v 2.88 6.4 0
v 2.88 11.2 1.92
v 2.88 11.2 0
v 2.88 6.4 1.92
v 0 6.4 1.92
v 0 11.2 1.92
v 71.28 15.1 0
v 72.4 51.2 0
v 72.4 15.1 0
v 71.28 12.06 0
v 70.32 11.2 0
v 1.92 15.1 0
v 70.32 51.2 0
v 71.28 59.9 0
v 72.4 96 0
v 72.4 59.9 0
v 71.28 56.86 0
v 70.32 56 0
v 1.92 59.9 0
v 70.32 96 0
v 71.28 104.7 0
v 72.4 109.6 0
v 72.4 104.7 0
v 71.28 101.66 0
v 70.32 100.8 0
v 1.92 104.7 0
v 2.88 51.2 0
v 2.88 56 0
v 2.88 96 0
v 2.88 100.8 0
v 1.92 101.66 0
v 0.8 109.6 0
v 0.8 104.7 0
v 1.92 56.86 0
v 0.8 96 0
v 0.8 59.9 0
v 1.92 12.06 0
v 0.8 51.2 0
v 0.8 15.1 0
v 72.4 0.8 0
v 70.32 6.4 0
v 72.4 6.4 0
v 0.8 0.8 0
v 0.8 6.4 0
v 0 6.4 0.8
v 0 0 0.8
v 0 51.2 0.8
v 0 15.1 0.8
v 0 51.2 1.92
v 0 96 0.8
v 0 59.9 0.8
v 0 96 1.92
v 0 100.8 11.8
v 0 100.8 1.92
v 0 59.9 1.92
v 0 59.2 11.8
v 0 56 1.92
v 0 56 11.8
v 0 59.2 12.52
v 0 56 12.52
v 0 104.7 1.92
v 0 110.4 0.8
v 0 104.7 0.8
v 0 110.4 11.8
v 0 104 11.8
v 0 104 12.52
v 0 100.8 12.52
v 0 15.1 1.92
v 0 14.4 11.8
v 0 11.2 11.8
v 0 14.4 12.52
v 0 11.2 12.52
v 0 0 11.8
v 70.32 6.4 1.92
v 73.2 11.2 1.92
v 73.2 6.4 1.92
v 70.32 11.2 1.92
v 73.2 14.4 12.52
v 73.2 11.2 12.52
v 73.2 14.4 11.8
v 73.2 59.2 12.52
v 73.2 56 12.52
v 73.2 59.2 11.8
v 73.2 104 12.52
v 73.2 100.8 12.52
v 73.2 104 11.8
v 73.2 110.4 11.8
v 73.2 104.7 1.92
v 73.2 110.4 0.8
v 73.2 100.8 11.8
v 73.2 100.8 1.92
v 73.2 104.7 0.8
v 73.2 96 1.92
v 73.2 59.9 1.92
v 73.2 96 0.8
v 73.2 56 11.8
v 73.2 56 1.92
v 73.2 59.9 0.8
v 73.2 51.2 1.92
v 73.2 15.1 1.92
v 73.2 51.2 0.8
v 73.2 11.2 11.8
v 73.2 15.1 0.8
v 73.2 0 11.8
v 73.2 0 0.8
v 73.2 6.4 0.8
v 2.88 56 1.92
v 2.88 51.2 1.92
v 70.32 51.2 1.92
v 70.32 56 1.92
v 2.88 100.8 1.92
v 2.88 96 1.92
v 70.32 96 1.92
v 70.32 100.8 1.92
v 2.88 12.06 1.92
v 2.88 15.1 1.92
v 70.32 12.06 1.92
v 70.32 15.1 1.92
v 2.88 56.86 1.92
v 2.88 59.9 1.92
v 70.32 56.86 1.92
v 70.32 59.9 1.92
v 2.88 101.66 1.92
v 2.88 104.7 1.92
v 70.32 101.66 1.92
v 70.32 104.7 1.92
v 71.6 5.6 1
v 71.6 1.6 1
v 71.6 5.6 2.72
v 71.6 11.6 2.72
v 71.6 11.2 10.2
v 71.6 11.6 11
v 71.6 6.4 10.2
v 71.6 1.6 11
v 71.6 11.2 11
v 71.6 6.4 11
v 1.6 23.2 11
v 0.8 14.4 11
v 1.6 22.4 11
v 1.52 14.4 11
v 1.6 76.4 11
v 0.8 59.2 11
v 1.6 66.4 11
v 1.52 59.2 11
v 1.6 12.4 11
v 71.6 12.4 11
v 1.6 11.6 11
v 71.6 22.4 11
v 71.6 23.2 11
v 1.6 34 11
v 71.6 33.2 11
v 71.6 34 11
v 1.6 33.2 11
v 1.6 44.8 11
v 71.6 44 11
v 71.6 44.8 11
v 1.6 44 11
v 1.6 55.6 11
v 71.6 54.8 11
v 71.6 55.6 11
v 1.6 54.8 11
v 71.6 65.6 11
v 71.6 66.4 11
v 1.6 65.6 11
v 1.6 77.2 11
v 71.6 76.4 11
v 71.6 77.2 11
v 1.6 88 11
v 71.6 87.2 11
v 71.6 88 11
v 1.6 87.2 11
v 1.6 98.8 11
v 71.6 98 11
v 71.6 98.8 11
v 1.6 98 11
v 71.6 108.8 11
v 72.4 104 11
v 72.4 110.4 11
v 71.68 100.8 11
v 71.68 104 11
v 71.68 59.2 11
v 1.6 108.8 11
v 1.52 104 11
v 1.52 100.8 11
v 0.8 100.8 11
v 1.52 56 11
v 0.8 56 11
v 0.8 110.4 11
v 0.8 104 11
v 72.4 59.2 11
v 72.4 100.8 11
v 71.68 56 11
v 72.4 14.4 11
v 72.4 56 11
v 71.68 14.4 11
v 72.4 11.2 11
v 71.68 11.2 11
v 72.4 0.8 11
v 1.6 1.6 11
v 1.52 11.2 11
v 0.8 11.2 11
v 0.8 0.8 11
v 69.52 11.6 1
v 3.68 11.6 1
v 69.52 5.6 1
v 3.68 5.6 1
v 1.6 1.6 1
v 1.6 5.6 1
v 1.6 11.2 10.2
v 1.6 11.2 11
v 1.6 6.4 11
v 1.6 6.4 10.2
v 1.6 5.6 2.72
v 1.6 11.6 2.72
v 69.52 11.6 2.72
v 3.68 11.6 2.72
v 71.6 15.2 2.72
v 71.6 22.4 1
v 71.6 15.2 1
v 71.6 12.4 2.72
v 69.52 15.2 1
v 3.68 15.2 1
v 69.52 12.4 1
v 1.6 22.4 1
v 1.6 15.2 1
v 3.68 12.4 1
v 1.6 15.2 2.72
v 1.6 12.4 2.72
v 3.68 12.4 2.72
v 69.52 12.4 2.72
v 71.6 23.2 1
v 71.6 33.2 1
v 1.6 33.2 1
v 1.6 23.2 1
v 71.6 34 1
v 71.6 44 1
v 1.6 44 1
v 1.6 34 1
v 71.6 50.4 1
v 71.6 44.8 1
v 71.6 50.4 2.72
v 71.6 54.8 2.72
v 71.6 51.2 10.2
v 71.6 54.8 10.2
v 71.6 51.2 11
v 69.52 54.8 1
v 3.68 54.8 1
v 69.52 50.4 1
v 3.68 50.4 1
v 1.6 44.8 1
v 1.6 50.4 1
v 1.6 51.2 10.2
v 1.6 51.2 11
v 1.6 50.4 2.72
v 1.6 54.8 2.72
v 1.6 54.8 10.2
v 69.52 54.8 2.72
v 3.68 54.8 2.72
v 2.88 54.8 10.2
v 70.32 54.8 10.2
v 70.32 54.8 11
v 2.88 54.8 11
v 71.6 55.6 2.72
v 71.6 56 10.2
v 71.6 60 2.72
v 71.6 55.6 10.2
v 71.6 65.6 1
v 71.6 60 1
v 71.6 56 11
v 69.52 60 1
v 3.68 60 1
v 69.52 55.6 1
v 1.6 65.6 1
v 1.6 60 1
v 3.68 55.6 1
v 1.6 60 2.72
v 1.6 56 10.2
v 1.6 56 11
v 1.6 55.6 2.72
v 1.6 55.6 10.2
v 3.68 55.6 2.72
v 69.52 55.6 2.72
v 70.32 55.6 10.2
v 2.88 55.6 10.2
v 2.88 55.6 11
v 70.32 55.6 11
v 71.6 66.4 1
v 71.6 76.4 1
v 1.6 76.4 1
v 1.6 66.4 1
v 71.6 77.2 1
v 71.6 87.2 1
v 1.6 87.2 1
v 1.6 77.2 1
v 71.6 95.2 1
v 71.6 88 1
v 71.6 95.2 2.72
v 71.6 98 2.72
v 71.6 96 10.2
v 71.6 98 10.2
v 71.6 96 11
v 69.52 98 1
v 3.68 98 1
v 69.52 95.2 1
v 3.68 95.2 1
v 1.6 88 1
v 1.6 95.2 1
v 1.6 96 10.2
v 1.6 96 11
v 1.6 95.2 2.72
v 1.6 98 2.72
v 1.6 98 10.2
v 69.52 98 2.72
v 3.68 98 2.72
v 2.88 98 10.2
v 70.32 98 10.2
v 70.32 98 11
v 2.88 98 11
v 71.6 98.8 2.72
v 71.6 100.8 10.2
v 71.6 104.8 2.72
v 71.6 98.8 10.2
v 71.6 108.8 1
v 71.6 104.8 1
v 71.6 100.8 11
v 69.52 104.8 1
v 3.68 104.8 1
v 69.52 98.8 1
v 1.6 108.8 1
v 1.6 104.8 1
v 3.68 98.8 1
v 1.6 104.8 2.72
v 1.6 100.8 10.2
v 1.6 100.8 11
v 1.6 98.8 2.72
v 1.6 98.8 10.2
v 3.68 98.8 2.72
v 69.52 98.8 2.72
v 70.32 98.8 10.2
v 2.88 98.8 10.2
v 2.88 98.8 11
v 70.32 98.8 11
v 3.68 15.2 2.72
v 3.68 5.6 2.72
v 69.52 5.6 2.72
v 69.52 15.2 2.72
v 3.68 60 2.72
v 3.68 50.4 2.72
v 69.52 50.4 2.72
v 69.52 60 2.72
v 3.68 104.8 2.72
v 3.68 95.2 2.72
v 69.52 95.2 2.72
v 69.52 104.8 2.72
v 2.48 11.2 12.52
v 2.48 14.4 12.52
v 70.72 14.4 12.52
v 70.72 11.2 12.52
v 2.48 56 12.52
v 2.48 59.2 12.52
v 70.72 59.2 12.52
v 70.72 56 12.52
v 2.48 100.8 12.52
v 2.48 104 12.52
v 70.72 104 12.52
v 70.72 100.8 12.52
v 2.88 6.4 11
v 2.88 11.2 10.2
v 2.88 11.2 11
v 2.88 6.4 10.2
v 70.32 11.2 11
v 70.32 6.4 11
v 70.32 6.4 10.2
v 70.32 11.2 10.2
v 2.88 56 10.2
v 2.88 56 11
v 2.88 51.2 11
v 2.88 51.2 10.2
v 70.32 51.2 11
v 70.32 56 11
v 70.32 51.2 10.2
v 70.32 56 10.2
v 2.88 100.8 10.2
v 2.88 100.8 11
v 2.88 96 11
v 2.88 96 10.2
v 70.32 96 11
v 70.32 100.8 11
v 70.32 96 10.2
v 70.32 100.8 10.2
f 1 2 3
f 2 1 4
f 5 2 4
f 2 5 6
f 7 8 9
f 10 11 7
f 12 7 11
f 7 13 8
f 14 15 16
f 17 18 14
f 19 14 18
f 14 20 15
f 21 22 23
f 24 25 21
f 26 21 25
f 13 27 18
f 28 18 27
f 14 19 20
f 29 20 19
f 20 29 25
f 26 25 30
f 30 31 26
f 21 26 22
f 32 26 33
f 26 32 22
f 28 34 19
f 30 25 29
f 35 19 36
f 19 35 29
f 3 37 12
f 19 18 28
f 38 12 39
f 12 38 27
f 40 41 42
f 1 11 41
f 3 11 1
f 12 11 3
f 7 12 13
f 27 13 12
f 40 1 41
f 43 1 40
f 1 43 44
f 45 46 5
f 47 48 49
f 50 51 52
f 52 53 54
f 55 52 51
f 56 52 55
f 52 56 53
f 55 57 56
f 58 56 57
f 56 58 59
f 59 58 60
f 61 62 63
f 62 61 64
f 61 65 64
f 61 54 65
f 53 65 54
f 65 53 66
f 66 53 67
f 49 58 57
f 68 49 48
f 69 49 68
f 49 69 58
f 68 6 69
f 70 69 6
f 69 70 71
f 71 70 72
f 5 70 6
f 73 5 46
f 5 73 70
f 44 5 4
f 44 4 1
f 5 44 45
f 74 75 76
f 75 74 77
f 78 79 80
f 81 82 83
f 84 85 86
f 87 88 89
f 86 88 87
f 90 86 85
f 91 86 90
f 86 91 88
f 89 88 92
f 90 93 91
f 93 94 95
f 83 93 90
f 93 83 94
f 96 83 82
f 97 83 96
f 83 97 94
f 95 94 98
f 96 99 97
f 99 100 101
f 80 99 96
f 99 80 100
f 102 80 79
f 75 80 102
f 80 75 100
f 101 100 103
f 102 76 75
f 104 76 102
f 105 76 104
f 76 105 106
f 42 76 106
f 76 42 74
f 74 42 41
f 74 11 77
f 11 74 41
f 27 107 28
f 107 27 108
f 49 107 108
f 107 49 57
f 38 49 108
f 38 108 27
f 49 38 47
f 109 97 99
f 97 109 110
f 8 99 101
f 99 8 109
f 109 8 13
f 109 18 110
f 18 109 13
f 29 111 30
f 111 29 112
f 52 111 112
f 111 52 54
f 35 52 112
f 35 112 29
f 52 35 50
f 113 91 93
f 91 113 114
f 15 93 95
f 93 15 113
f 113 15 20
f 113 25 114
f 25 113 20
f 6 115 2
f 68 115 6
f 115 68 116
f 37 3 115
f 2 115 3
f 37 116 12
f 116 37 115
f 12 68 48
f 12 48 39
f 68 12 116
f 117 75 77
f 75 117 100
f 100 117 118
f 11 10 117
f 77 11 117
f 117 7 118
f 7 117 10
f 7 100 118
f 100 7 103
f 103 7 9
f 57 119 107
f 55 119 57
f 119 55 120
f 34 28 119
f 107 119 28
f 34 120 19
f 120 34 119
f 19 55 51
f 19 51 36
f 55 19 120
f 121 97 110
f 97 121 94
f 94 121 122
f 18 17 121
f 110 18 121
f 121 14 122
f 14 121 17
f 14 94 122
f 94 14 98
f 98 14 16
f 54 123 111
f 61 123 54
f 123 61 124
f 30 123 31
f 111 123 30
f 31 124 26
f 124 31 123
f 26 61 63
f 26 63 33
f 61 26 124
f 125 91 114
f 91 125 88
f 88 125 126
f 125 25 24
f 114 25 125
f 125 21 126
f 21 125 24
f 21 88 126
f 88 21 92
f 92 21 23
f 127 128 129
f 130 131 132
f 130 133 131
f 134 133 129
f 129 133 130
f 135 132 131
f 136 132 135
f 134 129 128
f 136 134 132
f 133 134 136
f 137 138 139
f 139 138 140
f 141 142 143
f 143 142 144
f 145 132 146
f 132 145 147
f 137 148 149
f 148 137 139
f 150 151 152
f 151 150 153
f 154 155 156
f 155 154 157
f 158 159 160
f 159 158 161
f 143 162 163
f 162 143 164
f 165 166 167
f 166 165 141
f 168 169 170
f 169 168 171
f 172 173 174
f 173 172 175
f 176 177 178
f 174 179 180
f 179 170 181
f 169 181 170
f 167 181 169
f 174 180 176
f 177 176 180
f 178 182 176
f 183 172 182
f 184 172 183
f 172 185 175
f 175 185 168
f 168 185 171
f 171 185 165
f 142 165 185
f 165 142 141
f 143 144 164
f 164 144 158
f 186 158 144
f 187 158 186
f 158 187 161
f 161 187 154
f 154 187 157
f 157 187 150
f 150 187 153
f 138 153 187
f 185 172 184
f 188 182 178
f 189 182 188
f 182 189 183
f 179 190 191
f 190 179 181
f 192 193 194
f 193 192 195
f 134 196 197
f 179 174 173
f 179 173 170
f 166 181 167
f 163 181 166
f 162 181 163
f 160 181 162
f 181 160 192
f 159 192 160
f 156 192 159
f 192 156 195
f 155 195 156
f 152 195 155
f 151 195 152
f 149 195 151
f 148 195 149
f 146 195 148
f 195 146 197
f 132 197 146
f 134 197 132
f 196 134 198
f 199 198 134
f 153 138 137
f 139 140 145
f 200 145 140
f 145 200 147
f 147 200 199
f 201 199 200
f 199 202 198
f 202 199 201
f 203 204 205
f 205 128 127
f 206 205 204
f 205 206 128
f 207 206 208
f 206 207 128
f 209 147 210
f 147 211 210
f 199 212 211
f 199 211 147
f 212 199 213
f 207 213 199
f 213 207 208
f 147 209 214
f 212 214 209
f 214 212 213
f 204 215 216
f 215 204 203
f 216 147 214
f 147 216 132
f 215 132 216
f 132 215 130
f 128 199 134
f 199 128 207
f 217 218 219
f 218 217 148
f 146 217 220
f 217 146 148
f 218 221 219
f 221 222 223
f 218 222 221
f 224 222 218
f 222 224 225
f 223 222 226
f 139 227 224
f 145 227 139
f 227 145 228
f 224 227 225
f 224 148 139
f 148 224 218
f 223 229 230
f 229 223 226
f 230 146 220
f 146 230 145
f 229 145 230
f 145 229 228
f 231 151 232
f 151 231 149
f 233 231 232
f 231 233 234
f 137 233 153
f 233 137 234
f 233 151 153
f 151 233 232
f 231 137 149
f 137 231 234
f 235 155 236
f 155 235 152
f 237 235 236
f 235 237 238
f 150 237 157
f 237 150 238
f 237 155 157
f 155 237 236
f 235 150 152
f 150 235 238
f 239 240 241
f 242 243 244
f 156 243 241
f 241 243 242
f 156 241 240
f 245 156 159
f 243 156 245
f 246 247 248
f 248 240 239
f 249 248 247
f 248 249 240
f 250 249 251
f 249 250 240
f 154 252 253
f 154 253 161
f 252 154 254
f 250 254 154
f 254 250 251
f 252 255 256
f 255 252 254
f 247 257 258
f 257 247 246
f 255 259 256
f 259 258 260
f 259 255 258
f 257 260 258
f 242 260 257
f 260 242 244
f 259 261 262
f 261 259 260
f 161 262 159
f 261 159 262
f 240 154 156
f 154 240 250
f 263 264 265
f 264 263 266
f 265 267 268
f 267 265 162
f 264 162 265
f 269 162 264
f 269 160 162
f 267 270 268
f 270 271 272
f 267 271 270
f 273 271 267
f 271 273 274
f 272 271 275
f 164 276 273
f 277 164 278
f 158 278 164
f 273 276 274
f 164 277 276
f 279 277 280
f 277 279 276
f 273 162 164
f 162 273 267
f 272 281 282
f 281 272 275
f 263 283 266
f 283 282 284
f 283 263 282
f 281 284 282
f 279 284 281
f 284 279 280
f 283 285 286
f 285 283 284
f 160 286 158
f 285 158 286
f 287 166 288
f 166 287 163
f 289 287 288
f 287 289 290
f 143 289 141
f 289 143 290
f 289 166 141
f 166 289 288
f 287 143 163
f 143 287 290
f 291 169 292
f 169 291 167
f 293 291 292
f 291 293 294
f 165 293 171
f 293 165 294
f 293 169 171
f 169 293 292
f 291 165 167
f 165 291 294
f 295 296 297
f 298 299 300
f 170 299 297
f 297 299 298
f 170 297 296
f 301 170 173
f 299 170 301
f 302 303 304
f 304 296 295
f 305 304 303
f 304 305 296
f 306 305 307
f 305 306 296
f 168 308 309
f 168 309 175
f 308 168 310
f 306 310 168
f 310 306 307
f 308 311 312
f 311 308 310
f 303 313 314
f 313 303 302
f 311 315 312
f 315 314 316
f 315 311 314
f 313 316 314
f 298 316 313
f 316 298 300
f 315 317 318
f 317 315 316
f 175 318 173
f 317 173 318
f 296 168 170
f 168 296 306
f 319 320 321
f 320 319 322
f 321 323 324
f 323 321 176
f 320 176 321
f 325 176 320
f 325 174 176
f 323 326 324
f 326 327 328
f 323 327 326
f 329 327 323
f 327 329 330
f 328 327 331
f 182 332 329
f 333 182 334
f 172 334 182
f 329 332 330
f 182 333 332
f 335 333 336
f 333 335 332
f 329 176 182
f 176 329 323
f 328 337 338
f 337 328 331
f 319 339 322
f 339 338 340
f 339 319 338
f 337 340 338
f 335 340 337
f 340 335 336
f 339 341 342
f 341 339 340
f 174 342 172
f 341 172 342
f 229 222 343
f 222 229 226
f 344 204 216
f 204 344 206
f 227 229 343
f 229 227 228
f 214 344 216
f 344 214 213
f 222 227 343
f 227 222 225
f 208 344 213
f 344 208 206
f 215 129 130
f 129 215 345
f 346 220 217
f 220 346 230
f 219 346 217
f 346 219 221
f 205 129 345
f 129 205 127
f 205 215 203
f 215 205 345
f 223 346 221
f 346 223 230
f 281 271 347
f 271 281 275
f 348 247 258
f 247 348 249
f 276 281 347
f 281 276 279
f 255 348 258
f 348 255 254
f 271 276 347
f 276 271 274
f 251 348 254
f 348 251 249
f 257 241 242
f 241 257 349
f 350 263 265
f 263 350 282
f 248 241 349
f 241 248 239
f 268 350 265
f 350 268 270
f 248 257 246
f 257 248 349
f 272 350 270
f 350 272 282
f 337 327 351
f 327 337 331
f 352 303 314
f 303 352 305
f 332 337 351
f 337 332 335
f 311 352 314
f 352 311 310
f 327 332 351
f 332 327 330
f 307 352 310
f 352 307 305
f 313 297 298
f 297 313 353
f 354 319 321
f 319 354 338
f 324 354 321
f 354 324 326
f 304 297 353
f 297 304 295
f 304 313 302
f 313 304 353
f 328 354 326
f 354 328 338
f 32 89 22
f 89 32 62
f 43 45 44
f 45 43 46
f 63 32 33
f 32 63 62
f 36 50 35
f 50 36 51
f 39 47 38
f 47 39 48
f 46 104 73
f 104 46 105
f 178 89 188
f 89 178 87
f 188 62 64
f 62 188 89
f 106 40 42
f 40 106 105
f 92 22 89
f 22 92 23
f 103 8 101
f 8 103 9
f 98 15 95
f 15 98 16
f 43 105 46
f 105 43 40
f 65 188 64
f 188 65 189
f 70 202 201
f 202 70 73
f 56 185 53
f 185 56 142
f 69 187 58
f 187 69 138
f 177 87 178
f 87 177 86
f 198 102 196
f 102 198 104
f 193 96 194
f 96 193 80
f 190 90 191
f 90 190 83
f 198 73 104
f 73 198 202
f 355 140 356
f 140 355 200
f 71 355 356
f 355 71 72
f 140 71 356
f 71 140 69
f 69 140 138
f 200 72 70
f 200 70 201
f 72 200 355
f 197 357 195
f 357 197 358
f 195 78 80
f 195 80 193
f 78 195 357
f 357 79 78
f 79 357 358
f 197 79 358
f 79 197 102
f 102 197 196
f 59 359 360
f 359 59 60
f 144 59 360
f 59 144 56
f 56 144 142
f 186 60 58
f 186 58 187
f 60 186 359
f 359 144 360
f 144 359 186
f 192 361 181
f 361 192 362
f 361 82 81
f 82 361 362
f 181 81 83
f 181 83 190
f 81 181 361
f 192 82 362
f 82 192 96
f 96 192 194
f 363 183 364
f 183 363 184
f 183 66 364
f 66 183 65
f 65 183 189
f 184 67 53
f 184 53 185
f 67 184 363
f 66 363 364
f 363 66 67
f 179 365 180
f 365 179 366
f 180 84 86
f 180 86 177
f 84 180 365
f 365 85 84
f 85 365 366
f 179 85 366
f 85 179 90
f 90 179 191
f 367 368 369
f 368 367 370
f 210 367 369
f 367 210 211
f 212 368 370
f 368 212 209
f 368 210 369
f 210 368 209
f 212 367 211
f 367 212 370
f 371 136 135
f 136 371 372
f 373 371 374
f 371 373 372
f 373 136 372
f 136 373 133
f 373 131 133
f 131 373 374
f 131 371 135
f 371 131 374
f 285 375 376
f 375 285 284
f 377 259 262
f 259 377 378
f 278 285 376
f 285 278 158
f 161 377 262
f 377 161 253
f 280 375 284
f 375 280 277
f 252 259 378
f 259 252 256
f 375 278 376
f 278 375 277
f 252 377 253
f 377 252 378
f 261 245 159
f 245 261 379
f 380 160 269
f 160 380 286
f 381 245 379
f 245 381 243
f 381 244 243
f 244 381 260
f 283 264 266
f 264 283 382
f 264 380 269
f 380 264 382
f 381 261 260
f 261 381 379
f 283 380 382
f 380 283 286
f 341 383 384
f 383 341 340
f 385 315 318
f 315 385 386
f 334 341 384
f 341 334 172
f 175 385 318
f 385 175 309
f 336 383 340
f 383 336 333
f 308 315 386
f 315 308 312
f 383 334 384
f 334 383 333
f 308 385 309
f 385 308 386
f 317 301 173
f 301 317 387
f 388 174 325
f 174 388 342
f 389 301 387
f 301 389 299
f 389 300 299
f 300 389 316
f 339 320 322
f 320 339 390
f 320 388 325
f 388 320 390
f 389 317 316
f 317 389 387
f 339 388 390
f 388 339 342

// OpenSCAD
// Author: Gilad Raz 18mar19

/* [Main] */
part = "box"; // [box, lid, both]
cells = 10;
cell_width = 70;
cell_length = 10;
cell_height = 10;

if (part == "box")
    box(cells, cell_length, cell_width, cell_height);
else if (part == "lid")
    lid(cells, cell_length, cell_width, cell_height);
else
    box_and_lid(cells, cell_length, cell_width, cell_height);

//box_and_lid(10, 10, 70, 10);
//box_and_lid(10, 10, 70, 10);
//box_and_lid(1, 18, 20, 10);           // mini test

/* [Advanced] */
btm = 1;
wl = 1.6;
sep = 0.8;
bracketLen = wl*2;
bracketWd = wl*1.2;
brackets = 3;
bracketMargin = 0.4;

module box_and_lid(cells, cllen, wd, ht) {
    box(cells, cllen, wd, ht);
    translate([wd+wl*5,0,0])
        lid(cells, cllen, wd, ht);
}

module box(cells, cllen, wd, ht) {
    boxlen = wl*2 + cllen*cells + sep*(cells-1);
    difference() {
        hull() {
            translate([wl/2,wl/2,0])
                cube([wd+wl, boxlen -wl, wl]);
            translate([0,0,wl/2])
                cube([wd+wl*2, boxlen, btm + ht]);
        }
        bracket_all(wd, ht, boxlen, 0);
        translate([0, bracketLen+wl-0.1, 0])
            bracket_all(wd, ht, boxlen, 1);
        difference() {
            for (i=[0: 1: cells-1])
                translate([wl, wl+ i*cllen + i*sep, btm])
                    cube([wd, cllen, ht]);
            translate([0, -wl/2, 0])
                bracket_all(wd, ht, boxlen, 3);
        }
        hull() {
            translate([wl/2,wl/2,btm+ht])
                cube([wd+wl, boxlen, wl]);
            translate([0,0,btm+ht+wl/2])
                cube([wd+wl*2, boxlen+wl, 1]);
        }
    }
    translate([0, bracketLen+wl, btm+ht])
        bracket_all(wd, ht, boxlen, 2);
    translate([0, 0, btm+ht-wl/2])
        bracket_all(wd, ht, boxlen, 4);
}

module lid(cells, cllen, wd, ht) {
    ht = bracketWd+wl/2 - btm;
    boxlen = wl*2 + cllen*cells + sep*(cells-1);
    difference() {
        union() {
            hull() {
                translate([wl/2,wl/2,0])
                    cube([wd+wl, boxlen -wl, wl]);
                translate([0,0,wl/2])
                    cube([wd+wl*2, boxlen, btm + ht]);
            }
        }
        difference() {
            translate([wl, wl, btm])
                cube([wd, boxlen - wl*2, ht*2]);
            translate([0, -wl/2, 0])
                bracket_all(wd, ht, boxlen, 3);
        }
        bracket_all(wd, ht, boxlen, 0);
        translate([0, bracketLen+wl-0.1, 0])
            bracket_all(wd, ht, boxlen, 1);
        hull() {
            translate([wl/2,wl/2,btm+ht])
                cube([wd+wl, boxlen, wl]);
            translate([0,0,btm+ht+wl/2])
                cube([wd+wl*2, boxlen+wl, 1]);
        }
    }
}

module bracket_all(wd, ht, boxlen, type) {
    preBracket = bracketLen*2;
    totalBracket = bracketLen*2 + wl;
    bracketDist = (boxlen - preBracket*2 - totalBracket) / (brackets-1);
//    bracketDist = (boxlen - bracketLen*4) / (brackets-1);
//    echo(bracketDist);
//    for (dist=[bracketLen/2: max(bracketDist, bracketLen*2+wl*2) : boxlen-bracketLen*3]) {
    for (dist=[preBracket: max(bracketDist, totalBracket+wl) : boxlen-preBracket-wl]) {
        translate([0,dist,0])
                bracket(type);
        translate([wl*2+wd,dist,0])
            mirror()
               bracket(type);
    }
}

module bracket(type) {
    if (type == 0)          // bracket opening
        cube([bracketWd*1.5, bracketLen+wl, bracketWd]);
    else if (type == 1)     // bracket catcher
        rotate([270,0,0]) {
            hull() {
                linear_extrude(0.1)
                    polygon([[0,0], [bracketWd*1.5, 0], [bracketWd*1.5, -bracketWd], [0, -bracketWd]]);
                linear_extrude(bracketWd/2)
                    polygon([[0,0], [bracketWd, 0], [bracketWd*1.5, -bracketWd], [0, -bracketWd]]);
            }
            linear_extrude(bracketLen +bracketMargin*2)
                polygon([[0,0], [bracketWd, 0], [bracketWd*1.5, -bracketWd], [0, -bracketWd]]);
        }
    else if (type == 2)     // bracket
        rotate([270,0,0])
            linear_extrude(bracketLen)
                polygon([[0,0], [bracketWd-bracketMargin, 0], [bracketWd*1.5-bracketMargin, -bracketWd+bracketMargin], [0, -bracketWd+bracketMargin]]);
    else if (type == 3)     // filler for opening
        cube([bracketWd*1.5+wl/2, bracketLen*2+wl*2, bracketWd+wl/2]);
    else // if (type == 4)  // top cover for bracket opening
        cube([bracketWd*1.5, bracketLen+wl, wl/2]);
}
